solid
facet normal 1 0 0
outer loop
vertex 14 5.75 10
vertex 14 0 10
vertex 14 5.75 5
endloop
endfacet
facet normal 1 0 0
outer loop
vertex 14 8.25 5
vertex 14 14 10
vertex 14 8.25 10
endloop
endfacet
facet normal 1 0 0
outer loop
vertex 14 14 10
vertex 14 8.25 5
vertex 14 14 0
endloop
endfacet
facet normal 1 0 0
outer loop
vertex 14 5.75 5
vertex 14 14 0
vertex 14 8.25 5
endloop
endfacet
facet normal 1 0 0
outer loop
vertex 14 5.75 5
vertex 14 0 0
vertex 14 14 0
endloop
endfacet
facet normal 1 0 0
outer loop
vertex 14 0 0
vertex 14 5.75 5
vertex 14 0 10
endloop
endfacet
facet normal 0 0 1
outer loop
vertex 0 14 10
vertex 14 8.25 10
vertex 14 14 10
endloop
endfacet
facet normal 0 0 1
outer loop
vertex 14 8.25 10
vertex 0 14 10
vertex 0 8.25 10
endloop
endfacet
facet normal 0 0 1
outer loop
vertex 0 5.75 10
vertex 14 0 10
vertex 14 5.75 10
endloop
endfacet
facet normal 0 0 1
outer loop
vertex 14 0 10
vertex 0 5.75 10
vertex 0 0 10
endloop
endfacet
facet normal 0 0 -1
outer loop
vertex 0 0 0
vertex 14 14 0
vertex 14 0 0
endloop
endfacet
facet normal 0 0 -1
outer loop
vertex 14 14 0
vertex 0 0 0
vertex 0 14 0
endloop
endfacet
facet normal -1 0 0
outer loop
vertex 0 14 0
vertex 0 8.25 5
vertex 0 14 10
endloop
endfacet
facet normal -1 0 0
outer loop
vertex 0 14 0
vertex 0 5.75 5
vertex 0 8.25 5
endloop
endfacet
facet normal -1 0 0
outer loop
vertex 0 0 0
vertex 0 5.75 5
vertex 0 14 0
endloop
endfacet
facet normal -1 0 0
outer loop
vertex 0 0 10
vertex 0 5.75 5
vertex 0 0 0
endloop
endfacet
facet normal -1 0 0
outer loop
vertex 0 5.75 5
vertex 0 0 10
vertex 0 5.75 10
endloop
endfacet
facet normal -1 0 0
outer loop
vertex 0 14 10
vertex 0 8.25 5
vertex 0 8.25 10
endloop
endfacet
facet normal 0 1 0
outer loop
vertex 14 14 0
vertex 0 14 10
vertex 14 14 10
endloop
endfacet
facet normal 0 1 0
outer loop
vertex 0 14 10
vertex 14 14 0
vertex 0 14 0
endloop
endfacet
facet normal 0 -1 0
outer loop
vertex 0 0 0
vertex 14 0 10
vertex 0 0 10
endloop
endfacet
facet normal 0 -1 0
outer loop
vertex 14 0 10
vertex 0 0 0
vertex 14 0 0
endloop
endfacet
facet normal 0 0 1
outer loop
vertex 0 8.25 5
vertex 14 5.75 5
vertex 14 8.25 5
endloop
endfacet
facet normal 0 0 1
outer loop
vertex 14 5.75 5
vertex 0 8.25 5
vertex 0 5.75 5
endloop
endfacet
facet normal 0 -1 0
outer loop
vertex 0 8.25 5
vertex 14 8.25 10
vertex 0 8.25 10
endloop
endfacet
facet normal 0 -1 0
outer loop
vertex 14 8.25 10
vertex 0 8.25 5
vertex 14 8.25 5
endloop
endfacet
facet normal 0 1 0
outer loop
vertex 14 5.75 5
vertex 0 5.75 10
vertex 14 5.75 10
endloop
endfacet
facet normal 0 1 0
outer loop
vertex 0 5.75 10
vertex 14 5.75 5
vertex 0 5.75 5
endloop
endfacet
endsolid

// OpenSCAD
$fn = 32;

// ----------------------------------------------------------------------
// Micro clip: slotted block, 5-20 mm class
// ----------------------------------------------------------------------

// --- parameters (mm) ---
block_l = 14;             // block length, X
block_w = 14;             // block width, Y
block_h = 10;             // block height, Z
slot_w = 2.5;             // slot width
slot_d = 5;               // slot depth from the top

difference() {
  cube([block_l, block_w, block_h]);
  translate([-1, block_w / 2 - slot_w / 2, block_h - slot_d])
    cube([block_l + 2, slot_w, slot_d + 1]);
}
